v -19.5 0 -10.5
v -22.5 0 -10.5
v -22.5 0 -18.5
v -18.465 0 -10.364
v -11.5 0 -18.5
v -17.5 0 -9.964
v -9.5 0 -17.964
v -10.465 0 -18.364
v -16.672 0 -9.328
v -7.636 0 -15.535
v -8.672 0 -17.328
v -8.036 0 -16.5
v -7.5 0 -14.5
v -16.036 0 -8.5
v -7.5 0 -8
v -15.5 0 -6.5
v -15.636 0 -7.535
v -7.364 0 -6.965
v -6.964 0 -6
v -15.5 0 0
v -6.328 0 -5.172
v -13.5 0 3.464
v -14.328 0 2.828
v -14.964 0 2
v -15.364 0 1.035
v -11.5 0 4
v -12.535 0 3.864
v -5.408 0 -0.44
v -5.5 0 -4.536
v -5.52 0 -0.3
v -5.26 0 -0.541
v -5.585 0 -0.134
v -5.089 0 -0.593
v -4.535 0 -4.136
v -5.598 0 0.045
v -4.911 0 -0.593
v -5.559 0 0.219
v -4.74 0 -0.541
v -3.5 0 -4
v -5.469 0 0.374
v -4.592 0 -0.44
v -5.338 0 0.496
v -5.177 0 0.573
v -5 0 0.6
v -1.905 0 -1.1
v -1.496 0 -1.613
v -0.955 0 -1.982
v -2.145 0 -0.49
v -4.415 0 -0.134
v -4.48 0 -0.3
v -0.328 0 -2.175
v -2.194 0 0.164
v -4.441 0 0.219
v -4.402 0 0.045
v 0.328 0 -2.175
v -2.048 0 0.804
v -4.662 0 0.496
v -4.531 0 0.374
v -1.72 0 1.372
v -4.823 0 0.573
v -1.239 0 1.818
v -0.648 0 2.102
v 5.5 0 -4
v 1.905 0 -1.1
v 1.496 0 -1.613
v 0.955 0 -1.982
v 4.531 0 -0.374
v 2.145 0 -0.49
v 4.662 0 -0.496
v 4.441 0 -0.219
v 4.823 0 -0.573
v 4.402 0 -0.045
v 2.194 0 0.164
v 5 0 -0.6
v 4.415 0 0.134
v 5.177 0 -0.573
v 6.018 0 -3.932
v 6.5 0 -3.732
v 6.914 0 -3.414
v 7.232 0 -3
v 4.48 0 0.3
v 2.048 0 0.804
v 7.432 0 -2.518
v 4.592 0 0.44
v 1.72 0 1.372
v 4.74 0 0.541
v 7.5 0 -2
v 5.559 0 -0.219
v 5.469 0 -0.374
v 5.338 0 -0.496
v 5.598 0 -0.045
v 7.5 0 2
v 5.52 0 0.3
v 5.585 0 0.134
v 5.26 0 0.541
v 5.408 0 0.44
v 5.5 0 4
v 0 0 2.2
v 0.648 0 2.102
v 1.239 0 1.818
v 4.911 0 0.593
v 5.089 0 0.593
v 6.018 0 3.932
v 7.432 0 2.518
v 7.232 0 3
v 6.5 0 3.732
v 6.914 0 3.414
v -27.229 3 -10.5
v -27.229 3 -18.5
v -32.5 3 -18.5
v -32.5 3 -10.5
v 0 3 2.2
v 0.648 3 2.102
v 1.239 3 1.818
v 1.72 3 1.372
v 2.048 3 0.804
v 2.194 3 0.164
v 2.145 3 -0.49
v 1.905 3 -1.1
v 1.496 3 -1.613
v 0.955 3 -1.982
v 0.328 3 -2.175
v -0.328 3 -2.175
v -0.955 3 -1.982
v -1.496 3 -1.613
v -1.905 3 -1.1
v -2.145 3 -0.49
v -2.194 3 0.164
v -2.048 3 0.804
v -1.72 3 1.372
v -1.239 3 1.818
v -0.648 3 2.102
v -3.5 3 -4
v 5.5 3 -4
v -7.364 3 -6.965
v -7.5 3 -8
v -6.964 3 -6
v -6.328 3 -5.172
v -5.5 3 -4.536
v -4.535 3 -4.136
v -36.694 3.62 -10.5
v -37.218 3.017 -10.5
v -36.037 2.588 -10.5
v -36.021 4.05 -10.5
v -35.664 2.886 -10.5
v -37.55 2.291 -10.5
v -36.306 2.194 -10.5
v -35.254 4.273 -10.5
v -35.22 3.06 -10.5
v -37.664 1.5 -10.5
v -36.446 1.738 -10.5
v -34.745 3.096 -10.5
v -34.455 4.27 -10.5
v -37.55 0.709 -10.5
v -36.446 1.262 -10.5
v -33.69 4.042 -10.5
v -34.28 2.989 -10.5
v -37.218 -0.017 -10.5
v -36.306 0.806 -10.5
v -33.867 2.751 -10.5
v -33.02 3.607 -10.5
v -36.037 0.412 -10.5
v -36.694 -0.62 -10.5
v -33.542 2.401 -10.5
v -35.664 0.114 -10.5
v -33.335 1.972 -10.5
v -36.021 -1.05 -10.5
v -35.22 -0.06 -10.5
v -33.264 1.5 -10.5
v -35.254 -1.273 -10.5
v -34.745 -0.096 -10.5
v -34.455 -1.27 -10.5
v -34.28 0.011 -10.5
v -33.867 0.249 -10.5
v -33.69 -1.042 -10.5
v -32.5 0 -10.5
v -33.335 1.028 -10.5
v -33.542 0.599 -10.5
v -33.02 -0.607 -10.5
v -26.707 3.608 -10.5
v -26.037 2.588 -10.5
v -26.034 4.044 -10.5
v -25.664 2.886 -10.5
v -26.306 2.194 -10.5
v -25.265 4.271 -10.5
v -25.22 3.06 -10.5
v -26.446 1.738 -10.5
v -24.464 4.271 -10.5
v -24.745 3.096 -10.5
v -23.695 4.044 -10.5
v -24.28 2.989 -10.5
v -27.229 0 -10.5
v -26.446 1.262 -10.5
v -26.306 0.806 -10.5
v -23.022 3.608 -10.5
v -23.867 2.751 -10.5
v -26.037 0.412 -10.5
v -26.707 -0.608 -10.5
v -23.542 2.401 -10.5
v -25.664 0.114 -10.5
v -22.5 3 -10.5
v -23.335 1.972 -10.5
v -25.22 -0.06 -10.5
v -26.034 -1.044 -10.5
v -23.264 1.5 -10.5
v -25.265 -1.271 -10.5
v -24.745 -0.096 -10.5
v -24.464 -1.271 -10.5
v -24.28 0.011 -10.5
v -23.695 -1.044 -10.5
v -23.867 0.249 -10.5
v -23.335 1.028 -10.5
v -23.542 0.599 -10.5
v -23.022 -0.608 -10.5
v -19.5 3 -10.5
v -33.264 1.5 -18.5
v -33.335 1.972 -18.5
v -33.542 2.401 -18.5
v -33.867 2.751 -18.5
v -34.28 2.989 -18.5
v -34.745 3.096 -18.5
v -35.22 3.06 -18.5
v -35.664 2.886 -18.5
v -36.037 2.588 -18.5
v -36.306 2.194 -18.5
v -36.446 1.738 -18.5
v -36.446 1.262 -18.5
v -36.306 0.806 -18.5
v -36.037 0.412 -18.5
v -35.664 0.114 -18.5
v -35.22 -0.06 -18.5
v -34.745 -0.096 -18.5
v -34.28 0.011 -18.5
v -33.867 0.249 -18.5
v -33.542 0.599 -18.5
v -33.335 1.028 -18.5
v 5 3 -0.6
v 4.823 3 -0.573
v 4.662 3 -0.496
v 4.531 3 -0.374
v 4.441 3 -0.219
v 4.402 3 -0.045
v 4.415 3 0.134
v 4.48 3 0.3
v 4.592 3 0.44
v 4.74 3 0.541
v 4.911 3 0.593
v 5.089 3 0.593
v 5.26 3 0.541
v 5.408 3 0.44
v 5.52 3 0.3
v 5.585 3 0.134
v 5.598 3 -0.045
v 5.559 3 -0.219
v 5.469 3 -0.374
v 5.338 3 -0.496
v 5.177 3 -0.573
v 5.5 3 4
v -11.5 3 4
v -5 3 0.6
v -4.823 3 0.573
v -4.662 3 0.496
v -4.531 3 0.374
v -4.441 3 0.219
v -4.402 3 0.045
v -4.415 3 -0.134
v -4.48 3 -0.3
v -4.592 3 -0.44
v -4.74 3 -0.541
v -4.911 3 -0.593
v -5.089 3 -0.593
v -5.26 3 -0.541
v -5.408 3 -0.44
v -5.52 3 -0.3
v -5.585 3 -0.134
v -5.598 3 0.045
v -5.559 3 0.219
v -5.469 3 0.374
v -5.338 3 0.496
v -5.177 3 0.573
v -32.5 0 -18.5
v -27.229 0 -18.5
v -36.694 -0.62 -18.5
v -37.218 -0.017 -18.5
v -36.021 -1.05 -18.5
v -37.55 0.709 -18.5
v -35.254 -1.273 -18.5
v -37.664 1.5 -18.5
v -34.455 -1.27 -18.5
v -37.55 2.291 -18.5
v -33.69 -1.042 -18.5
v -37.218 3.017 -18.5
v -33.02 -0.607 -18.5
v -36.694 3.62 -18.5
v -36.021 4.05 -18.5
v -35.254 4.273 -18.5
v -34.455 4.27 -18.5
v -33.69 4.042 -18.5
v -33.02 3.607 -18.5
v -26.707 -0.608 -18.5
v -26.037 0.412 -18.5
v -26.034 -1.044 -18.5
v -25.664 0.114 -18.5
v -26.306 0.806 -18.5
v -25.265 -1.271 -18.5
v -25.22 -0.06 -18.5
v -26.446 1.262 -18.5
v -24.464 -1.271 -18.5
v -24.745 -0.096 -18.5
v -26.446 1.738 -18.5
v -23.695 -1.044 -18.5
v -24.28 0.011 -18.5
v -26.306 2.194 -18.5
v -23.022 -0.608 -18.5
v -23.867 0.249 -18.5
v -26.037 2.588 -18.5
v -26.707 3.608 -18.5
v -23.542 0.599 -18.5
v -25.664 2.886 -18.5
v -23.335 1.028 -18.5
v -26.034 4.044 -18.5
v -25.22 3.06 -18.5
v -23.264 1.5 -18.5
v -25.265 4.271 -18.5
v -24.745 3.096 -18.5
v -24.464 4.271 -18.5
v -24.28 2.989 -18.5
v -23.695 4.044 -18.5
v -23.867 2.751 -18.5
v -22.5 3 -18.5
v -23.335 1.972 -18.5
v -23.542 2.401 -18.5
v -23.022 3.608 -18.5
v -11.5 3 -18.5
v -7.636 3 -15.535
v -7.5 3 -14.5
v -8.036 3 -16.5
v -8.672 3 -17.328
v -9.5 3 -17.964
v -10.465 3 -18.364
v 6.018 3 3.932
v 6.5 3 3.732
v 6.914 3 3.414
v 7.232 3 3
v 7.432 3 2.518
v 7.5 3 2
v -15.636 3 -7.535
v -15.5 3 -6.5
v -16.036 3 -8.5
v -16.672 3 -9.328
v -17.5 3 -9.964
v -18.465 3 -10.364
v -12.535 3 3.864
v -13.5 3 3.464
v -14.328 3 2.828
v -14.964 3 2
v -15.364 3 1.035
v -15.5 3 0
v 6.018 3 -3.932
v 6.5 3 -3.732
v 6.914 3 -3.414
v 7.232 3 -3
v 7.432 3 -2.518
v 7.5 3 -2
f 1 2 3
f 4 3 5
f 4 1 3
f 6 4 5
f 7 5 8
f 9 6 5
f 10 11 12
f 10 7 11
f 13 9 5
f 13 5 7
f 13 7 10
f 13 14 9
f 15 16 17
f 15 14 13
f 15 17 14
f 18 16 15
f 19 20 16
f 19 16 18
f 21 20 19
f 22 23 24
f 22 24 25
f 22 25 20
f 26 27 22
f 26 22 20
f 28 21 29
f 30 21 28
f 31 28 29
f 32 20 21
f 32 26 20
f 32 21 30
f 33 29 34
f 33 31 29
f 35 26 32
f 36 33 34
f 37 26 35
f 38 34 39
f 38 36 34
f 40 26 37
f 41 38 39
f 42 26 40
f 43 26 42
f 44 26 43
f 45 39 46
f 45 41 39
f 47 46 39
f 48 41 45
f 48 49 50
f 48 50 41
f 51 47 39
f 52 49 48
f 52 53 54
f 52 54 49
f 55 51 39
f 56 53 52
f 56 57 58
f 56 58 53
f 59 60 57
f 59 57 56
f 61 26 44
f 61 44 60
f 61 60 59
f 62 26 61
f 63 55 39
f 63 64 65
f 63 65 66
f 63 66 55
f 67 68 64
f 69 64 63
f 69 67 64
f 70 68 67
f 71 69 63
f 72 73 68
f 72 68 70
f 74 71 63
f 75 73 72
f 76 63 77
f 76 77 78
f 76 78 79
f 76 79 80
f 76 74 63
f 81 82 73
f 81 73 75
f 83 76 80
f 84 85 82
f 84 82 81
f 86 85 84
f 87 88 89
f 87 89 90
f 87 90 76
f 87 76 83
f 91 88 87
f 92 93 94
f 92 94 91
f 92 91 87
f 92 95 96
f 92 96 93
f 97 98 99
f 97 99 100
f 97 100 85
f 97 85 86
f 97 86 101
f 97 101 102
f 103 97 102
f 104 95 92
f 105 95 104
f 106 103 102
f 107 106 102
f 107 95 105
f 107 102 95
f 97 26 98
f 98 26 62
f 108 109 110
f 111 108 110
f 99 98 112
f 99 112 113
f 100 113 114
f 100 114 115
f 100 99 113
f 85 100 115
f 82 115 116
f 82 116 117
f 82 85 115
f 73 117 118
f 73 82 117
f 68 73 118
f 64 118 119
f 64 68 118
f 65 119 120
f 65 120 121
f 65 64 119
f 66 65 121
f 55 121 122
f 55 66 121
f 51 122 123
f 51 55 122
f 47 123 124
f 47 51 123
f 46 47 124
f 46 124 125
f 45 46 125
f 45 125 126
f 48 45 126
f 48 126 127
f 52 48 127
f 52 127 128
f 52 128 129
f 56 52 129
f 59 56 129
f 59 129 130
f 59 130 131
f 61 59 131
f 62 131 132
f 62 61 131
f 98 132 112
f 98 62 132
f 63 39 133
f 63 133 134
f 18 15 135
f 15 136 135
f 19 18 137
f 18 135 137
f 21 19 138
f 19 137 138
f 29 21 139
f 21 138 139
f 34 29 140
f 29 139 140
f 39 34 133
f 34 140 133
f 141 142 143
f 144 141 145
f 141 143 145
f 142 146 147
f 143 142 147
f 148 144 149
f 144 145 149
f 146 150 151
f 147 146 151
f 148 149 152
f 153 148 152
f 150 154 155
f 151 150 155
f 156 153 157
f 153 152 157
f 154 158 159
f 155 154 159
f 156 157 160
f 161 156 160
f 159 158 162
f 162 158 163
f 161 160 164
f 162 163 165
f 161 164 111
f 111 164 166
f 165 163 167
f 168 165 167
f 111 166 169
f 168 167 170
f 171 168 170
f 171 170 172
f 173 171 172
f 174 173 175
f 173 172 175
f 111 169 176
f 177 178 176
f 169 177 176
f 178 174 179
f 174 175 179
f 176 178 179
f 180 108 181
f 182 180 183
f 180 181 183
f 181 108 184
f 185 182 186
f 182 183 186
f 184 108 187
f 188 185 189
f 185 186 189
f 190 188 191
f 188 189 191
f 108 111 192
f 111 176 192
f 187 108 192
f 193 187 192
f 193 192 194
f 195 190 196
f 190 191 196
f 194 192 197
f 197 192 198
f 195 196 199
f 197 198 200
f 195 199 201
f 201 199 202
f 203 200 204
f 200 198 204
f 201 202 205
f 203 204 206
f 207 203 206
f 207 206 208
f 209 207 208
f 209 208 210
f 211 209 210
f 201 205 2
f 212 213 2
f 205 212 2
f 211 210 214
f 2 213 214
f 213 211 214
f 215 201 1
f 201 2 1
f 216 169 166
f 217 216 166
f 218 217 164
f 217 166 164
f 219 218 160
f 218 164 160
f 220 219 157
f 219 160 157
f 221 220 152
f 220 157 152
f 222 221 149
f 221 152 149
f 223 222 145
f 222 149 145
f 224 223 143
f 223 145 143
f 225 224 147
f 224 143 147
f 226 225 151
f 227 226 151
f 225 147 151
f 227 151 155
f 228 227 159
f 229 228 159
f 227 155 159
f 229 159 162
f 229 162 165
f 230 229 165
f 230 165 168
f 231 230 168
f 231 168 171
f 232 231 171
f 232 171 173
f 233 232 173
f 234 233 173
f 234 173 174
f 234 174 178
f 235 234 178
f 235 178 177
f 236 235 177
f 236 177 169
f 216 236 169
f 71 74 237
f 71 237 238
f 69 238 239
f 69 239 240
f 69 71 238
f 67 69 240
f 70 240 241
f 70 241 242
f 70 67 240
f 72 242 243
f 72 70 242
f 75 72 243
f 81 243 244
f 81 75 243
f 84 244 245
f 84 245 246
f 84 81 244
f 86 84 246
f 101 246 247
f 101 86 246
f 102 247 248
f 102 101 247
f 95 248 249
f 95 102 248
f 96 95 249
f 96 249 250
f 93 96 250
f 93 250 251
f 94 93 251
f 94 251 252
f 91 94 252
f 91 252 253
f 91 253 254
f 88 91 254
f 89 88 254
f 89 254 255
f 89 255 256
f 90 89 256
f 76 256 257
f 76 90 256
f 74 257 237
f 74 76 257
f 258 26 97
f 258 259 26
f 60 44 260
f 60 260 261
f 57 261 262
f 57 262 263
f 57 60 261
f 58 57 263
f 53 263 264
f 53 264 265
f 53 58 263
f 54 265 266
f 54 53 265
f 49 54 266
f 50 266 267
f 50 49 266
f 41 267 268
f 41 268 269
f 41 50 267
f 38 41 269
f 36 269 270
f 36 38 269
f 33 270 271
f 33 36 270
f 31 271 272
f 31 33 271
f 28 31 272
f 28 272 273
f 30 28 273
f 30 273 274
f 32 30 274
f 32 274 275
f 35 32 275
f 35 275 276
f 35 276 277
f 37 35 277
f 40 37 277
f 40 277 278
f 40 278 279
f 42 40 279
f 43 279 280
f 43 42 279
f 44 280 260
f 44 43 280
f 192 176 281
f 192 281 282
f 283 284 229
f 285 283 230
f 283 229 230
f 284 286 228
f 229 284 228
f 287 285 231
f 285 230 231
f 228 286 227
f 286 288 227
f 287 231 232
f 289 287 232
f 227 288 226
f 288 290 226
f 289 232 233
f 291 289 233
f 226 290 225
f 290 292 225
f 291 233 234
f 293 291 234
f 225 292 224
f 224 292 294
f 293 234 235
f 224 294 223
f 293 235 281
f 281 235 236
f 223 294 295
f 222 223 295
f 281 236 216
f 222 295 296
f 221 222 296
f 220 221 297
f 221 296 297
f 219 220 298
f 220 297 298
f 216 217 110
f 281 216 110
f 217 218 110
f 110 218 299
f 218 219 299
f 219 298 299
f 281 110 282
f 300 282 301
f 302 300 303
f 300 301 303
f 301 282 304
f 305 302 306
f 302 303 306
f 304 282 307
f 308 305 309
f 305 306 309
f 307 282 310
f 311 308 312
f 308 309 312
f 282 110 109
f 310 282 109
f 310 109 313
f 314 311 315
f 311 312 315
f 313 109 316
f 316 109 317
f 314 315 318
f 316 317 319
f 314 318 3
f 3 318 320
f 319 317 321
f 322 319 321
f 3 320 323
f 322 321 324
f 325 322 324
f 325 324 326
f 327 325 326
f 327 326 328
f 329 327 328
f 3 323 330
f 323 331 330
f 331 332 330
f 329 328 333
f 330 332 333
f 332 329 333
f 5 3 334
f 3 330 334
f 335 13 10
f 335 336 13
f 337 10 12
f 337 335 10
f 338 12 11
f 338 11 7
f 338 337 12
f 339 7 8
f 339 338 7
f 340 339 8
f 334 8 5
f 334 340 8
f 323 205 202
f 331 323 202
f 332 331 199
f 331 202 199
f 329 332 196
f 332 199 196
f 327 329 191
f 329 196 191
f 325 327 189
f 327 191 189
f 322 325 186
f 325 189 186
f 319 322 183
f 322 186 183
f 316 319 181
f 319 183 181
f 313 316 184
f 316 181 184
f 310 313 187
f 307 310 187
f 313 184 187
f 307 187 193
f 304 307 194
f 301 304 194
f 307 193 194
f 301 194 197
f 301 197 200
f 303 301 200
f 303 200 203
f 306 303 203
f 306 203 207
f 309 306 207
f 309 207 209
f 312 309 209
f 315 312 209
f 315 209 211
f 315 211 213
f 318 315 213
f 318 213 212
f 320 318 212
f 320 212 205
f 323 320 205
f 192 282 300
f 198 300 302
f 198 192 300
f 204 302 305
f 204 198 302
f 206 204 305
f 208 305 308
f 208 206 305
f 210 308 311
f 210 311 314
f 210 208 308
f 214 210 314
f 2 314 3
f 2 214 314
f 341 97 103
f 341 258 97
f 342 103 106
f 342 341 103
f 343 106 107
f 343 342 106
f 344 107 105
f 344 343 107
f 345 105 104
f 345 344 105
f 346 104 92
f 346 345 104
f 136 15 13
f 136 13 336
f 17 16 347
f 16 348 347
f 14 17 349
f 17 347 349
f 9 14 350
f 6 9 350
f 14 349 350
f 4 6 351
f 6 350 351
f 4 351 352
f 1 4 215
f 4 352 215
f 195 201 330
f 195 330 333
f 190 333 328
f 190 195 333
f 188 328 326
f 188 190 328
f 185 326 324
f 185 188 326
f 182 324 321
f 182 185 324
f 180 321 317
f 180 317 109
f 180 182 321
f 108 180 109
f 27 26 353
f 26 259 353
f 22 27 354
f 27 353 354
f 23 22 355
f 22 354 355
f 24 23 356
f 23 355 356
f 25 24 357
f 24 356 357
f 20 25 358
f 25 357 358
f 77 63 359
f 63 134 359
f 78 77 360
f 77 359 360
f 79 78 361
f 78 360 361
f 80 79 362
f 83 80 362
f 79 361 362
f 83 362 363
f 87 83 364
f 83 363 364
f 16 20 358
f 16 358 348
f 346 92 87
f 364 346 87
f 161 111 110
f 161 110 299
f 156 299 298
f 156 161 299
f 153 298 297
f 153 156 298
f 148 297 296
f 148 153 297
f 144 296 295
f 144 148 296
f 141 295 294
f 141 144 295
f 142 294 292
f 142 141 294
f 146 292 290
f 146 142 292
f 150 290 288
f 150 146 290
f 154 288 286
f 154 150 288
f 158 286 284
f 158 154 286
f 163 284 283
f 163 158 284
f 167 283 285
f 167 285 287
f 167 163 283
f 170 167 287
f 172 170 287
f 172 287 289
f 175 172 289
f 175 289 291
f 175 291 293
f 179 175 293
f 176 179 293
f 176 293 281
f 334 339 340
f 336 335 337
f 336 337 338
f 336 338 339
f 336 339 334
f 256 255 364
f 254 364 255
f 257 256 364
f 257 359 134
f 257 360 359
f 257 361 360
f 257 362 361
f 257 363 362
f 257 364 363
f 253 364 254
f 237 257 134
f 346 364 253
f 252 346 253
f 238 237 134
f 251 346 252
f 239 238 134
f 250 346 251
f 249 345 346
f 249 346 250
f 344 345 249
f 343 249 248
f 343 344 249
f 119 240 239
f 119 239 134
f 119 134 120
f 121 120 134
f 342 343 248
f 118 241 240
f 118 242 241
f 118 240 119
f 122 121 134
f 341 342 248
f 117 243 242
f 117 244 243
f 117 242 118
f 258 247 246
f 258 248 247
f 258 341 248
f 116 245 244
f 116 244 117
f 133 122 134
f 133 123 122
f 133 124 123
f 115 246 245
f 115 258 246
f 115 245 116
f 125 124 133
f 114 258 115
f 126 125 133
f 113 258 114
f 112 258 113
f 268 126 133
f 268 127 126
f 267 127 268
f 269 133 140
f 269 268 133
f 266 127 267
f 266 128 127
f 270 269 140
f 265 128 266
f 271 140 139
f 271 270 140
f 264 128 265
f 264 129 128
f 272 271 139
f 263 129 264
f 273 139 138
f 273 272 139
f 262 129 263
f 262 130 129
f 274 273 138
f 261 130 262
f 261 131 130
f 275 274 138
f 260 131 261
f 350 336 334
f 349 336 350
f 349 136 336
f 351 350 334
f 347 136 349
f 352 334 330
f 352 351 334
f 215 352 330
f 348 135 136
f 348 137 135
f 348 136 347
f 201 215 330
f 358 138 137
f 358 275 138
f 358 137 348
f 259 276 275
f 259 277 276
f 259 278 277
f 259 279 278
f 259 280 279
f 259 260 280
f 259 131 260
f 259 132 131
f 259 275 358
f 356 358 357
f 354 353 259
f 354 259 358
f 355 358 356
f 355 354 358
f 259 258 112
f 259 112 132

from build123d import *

# Parameters (mm, degrees)
SKETCH_1_W               = 15
SKETCH_1_H               = 8
SKETCH_1_R               = 2.2
SKETCH_1_R_2             = 0.6
EXTRUDE_1_DEPTH          = 3
FILLET_1_R               = 2
SKETCH_2_R               = 1.6
EXTRUDE_2_DEPTH          = 22.5
CUT_EXTRUDE_1_DEPTH      = 43.182233899
CUT_EXTRUDE_1_DEPTH_BACK = 43.182233899
SKETCH_3_W               = 22.164318084
SKETCH_3_H               = 14.5
FILLET_2_R               = 4


with BuildPart() as part:
    # 草图1 → 凸台-拉伸1 (new body)
    with BuildSketch(Plane(origin=(0, 0, 0), x_dir=(1, 0, 0), z_dir=(0, 1, 0))):
        Rectangle(SKETCH_1_W, SKETCH_1_H)
        with Locations(Location((0, 0, 0), (0, 0, 270))):
            Circle(SKETCH_1_R, mode=Mode.SUBTRACT)
        with Locations(Location((-5, 0, 0), (0, 0, 270))):
            Circle(SKETCH_1_R_2, mode=Mode.SUBTRACT)
        with Locations(Location((5, 0, 0), (0, 0, 90))):
            Circle(SKETCH_1_R_2, mode=Mode.SUBTRACT)
    extrude(amount=EXTRUDE_1_DEPTH)

    # 圆角1
    fillet_1_edges = [part.edges().sort_by_distance(p)[0] for p in [
        (7.5, 1.5, 4),
        (7.5, 1.5, -4),
    ]]
    fillet(fillet_1_edges, radius=FILLET_1_R)

    # 草图2 → 凸台-拉伸2 (add)
    with BuildSketch(Plane.XY.offset(4)):
        with BuildLine():
            Line((-7.5, 0), (-7.5, 3))
            Line((-7.5, 3), (-22.5, 3))
            ThreePointArc((-22.5, 3), (-24.864318084, 4.3), (-27.228636167, 3))
            Line((-27.228636167, 3), (-32.5, 3))
            ThreePointArc((-32.5, 3), (-37.664318084, 1.5), (-32.5, 0))
            Line((-32.5, 0), (-27.228636167, 0))
            ThreePointArc((-27.228636167, 0), (-24.864318084, -1.3), (-22.5, 0))
            Line((-22.5, 0), (-7.5, 0))
        make_face()
        with Locations((-24.864318084, 1.5)):
            Circle(SKETCH_2_R, mode=Mode.SUBTRACT)
        with Locations((-34.864318084, 1.5)):
            Circle(SKETCH_2_R, mode=Mode.SUBTRACT)
    extrude(amount=-EXTRUDE_2_DEPTH)

    # 草图3 → 切除-拉伸1 (cut, two sides: drawn at the far end of the back side and taken through both)
    with BuildSketch(Plane(origin=(0, 3, 0), x_dir=(1, 0, 0), z_dir=(0, 1, 0)).offset(-CUT_EXTRUDE_1_DEPTH_BACK)):
        with Locations((-26.582159042, 3.25)):
            Rectangle(SKETCH_3_W, SKETCH_3_H)
    extrude(amount=CUT_EXTRUDE_1_DEPTH + CUT_EXTRUDE_1_DEPTH_BACK, mode=Mode.SUBTRACT)

    # 圆角2
    fillet_2_edges = [part.edges().sort_by_distance(p)[0] for p in [
        (-7.5, 1.5, -18.5),
        (-15.5, 1.5, -10.5),
        (-7.5, 1.5, -4),
        (-15.5, 1.5, 4),
    ]]
    fillet(fillet_2_edges, radius=FILLET_2_R)


solid = part.part
